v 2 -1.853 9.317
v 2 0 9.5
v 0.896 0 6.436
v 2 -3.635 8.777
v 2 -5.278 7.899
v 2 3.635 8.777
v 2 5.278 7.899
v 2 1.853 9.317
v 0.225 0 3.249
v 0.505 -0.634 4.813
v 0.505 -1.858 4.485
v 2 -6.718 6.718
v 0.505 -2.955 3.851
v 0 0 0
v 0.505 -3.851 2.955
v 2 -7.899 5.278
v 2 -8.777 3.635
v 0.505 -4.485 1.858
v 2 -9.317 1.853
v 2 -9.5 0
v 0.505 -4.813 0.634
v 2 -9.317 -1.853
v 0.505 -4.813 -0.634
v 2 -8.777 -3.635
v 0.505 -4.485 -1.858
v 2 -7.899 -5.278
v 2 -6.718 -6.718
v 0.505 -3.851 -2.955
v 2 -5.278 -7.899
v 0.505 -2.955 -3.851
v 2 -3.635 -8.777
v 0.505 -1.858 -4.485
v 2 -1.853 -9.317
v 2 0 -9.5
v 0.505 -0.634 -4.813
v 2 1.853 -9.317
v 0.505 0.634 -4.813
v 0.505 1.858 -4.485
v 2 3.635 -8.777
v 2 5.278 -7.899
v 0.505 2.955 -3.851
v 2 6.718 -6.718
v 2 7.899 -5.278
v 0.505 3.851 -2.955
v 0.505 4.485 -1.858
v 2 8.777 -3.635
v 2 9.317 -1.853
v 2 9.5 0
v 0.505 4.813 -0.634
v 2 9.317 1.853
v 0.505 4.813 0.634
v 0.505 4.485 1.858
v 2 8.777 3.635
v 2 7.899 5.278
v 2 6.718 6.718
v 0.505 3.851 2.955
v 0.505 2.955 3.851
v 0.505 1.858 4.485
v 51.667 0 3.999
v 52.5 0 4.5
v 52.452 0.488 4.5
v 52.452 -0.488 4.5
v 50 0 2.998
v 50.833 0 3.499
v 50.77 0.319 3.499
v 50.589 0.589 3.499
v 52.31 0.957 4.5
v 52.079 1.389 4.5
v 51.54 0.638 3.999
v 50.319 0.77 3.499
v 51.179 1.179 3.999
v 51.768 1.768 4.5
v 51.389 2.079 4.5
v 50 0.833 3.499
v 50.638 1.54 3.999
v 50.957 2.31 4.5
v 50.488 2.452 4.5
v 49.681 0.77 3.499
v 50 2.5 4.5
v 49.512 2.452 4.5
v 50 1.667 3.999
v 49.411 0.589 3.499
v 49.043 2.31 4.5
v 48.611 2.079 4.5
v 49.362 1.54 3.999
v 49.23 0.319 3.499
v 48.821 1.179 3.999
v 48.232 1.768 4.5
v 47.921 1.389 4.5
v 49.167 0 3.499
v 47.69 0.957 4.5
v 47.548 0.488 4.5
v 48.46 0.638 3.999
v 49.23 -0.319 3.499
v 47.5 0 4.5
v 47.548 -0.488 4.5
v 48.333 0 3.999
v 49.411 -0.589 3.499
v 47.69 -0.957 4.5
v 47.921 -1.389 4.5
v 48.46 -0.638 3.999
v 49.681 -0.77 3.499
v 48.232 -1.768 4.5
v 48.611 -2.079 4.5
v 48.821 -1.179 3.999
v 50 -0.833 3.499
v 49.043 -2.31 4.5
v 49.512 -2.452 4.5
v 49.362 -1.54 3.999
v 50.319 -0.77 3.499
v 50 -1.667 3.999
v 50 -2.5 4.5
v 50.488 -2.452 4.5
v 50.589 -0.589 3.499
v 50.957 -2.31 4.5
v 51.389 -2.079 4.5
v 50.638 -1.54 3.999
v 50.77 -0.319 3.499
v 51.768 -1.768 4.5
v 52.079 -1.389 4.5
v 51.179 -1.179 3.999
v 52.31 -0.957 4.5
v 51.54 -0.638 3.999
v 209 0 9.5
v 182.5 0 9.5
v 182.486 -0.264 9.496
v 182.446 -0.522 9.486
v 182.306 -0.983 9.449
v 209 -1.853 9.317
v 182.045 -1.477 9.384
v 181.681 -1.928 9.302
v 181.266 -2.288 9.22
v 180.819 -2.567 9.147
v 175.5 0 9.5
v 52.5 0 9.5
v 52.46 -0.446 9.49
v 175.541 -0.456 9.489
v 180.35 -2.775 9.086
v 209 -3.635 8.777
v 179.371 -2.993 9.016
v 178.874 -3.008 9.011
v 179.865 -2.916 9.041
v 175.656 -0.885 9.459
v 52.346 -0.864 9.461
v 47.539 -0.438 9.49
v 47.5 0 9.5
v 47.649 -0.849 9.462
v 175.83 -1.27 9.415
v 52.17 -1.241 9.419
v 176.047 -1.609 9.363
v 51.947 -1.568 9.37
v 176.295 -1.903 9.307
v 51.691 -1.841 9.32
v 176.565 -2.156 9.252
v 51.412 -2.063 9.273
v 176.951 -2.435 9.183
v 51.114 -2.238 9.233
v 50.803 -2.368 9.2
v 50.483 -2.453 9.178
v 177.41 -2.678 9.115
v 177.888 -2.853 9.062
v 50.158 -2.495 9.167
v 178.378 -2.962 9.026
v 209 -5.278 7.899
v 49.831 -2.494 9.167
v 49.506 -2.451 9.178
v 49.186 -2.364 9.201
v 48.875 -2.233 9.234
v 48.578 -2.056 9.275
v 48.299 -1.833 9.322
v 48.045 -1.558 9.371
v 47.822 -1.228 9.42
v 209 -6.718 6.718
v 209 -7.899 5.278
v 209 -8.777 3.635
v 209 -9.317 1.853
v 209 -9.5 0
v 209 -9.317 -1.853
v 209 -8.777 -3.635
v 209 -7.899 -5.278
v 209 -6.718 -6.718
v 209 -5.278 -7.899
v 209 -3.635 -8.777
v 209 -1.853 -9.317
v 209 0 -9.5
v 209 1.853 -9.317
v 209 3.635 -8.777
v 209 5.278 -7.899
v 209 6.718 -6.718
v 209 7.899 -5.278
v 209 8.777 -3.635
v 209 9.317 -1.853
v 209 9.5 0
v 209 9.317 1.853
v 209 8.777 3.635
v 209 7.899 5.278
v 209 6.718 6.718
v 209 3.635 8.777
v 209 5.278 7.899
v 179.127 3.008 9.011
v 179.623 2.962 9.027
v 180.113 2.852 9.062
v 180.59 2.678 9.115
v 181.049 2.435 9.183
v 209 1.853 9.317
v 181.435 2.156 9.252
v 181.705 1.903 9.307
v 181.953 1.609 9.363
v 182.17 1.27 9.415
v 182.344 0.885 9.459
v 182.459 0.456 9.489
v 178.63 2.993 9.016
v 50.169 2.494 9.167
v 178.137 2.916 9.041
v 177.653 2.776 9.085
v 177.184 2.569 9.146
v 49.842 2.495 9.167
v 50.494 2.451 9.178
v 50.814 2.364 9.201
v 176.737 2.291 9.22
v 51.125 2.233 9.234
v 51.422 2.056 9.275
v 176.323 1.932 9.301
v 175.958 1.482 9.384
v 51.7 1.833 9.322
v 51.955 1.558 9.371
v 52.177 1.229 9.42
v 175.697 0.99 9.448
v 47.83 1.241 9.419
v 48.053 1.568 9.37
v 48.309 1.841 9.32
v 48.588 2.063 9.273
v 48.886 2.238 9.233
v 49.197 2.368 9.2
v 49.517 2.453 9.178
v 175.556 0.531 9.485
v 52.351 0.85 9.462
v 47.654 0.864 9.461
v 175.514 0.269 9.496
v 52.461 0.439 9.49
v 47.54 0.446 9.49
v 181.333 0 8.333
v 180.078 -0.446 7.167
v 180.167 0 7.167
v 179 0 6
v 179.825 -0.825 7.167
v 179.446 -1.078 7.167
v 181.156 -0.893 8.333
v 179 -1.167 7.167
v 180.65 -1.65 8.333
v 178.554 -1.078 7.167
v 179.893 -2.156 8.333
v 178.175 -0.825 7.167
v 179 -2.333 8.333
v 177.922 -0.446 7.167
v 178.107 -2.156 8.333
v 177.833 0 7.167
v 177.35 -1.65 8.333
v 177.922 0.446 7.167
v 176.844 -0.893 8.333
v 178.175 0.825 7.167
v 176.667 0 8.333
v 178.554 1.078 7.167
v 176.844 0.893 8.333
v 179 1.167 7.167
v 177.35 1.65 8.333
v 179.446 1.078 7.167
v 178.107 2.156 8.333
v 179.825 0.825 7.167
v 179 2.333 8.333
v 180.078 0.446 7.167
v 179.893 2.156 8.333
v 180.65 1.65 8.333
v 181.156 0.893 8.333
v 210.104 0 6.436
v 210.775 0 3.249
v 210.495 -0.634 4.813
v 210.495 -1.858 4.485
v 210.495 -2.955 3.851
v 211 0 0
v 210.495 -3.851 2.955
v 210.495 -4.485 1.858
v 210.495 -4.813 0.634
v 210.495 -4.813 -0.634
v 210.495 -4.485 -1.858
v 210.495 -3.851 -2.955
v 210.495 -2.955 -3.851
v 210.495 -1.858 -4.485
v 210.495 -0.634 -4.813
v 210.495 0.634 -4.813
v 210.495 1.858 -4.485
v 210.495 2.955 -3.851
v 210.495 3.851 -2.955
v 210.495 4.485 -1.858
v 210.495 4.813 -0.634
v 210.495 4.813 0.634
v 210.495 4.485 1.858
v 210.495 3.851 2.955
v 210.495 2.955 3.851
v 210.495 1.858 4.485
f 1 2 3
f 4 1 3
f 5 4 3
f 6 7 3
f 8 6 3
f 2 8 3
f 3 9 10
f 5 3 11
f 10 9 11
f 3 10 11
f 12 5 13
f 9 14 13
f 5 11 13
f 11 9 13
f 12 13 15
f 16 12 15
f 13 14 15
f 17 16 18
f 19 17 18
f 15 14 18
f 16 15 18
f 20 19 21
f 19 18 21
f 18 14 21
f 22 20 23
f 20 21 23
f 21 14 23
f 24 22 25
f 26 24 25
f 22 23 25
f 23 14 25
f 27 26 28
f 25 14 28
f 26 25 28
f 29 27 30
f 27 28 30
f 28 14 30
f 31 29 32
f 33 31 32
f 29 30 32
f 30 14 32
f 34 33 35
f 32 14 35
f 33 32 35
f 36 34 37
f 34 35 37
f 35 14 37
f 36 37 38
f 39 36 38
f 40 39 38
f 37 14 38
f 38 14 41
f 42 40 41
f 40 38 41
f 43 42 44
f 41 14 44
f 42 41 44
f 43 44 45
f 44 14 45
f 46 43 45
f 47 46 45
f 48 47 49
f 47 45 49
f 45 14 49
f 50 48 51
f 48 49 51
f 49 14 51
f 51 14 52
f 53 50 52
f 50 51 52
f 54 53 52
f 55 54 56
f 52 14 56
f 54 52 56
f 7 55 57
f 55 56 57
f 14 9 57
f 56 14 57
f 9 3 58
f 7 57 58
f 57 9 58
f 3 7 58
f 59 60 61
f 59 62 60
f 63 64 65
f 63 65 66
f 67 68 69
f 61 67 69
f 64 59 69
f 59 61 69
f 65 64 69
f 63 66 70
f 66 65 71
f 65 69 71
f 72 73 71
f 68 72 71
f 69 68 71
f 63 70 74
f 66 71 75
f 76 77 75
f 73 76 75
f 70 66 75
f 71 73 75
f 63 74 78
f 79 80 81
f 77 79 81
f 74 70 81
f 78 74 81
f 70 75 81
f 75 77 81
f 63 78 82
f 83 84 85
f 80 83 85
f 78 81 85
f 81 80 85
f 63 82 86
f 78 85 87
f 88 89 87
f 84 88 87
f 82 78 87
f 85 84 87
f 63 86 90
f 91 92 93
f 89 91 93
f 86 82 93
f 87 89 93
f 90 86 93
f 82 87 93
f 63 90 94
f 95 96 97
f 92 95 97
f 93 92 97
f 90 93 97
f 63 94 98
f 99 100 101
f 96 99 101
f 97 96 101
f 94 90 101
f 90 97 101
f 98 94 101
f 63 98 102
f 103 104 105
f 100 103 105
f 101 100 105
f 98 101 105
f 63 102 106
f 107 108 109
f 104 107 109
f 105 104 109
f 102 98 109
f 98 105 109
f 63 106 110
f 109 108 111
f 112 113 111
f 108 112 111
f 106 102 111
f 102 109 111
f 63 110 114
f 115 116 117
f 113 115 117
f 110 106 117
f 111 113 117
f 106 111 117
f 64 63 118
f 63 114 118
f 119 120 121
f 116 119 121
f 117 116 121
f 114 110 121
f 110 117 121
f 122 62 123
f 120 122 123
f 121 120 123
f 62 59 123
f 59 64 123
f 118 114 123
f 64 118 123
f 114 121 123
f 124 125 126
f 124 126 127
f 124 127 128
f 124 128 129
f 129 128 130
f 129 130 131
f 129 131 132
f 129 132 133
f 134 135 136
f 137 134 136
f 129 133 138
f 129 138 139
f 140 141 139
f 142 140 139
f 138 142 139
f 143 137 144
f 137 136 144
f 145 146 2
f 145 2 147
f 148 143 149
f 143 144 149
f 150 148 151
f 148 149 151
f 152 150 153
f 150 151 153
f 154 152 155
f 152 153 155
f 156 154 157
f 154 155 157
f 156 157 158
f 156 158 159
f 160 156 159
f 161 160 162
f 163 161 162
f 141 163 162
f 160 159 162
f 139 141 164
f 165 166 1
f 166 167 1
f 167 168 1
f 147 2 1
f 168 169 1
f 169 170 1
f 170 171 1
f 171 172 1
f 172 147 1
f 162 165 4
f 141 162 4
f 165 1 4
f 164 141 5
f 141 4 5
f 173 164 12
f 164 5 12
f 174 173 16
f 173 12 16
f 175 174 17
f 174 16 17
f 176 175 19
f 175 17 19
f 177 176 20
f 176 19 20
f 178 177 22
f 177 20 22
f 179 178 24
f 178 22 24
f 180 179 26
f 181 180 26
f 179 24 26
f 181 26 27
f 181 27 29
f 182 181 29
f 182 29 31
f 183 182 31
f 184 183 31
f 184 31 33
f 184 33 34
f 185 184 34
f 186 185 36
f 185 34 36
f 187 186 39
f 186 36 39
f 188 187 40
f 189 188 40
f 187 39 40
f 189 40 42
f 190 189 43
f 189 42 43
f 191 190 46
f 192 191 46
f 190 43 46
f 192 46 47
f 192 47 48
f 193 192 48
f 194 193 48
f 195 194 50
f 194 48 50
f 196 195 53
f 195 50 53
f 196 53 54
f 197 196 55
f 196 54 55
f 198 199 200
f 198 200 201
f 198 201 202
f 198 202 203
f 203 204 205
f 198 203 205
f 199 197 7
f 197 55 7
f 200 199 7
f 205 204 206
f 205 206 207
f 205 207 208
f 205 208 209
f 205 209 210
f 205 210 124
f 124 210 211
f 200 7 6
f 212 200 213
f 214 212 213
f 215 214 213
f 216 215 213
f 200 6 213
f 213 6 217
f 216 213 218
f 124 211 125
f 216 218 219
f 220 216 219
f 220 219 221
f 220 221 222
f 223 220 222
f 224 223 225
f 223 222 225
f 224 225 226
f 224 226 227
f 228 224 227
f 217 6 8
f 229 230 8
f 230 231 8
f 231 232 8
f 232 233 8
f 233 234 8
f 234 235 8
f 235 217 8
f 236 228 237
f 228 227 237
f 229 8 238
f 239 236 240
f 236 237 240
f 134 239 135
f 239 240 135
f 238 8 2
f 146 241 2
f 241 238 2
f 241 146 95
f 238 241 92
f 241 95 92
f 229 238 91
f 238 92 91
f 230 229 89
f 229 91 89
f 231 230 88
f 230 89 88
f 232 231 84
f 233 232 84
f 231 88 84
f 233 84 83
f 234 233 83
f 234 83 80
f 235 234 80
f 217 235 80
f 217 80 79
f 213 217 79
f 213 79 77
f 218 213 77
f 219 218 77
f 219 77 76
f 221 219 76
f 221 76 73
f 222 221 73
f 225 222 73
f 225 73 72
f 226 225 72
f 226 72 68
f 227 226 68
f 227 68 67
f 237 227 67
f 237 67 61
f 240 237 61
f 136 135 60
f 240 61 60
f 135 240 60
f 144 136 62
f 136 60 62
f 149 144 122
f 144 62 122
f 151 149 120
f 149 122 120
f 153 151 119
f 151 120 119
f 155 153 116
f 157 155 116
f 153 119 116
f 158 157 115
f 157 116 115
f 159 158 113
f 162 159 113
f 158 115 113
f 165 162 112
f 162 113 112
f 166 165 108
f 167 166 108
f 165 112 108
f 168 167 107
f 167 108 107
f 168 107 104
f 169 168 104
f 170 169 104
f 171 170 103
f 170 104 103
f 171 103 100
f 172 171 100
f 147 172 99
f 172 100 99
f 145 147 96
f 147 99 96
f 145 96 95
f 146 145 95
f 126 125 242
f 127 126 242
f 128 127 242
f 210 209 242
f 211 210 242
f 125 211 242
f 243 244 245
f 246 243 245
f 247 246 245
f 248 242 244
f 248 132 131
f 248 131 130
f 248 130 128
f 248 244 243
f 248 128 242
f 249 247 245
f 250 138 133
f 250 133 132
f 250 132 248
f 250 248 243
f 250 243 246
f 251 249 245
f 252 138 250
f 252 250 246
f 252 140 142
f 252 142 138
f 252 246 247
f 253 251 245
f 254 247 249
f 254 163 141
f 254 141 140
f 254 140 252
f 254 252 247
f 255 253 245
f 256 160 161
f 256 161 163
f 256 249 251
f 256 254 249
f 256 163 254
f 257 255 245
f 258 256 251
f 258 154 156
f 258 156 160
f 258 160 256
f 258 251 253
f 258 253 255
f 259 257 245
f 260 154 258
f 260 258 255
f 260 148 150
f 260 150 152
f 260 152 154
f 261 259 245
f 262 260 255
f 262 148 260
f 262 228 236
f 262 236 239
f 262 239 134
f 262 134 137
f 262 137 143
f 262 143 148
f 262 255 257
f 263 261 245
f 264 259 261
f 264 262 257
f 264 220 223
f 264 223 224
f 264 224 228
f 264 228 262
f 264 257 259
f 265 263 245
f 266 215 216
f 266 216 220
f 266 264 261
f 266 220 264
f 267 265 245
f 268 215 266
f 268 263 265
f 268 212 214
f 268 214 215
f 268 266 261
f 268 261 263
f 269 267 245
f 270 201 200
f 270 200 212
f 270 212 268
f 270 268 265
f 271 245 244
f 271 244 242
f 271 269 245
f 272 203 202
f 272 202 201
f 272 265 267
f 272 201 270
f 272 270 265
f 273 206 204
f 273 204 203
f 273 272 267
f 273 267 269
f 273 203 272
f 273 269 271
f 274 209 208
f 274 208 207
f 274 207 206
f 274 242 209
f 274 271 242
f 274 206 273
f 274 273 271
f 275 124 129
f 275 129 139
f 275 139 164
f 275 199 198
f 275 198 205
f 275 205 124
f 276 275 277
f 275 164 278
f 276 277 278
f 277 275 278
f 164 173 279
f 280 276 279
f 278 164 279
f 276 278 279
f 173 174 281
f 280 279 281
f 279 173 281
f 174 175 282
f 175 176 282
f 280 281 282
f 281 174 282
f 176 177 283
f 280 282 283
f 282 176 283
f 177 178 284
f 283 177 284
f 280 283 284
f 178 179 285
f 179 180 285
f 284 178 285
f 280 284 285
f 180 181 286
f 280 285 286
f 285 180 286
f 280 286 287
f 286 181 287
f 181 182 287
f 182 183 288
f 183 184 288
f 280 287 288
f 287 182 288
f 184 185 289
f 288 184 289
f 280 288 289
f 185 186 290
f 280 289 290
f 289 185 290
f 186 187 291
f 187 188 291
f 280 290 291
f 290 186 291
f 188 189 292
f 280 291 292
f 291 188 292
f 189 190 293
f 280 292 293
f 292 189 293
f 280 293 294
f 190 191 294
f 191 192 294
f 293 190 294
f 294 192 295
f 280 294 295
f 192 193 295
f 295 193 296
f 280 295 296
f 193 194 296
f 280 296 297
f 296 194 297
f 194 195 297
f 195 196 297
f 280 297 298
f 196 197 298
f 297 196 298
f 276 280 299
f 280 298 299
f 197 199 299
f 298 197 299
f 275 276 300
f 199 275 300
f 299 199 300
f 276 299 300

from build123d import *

# Parameters (mm, degrees)
F4_D     = 5
F4_DEPTH = 5
F4_TIP   = 1.5021515476


with BuildPart() as f1:
    # F0 (on Front) → F1 (revolve)
    with BuildSketch(Plane.XZ):
        with BuildLine():
            Line((209, 9.5), (2, 9.5))
            ThreePointArc((2, 9.5), (0.5054206912, 4.8541219597), (0, 0))
            Line((0, 0), (211, 0))
            ThreePointArc((211, 0), (210.4945793088, 4.8541219597), (209, 9.5))
        make_face()
    revolve(axis=Axis((104.3779142201, 0, 0), (1, 0, 0)))

    # F4
    with Locations(Plane.XY.offset(9.5)):
        with Locations((50, 0)):
            Hole(F4_D / 2, depth=F4_DEPTH)
            with Locations((0, 0, -(F4_DEPTH + F4_TIP / 2))):  # 118° drill point
                Cone(0, F4_D / 2, F4_TIP, mode=Mode.SUBTRACT)

    # F5 (on Front) → F6 (revolve, cut)
    with BuildSketch(Plane.XZ):
        Polygon((184.5, 11.5), (179, 11.5), (179, 6), align=None)
    revolve(axis=Axis((179, 0, -0.0294297934), (0, 0, -1)), mode=Mode.SUBTRACT)


solid = f1.part
